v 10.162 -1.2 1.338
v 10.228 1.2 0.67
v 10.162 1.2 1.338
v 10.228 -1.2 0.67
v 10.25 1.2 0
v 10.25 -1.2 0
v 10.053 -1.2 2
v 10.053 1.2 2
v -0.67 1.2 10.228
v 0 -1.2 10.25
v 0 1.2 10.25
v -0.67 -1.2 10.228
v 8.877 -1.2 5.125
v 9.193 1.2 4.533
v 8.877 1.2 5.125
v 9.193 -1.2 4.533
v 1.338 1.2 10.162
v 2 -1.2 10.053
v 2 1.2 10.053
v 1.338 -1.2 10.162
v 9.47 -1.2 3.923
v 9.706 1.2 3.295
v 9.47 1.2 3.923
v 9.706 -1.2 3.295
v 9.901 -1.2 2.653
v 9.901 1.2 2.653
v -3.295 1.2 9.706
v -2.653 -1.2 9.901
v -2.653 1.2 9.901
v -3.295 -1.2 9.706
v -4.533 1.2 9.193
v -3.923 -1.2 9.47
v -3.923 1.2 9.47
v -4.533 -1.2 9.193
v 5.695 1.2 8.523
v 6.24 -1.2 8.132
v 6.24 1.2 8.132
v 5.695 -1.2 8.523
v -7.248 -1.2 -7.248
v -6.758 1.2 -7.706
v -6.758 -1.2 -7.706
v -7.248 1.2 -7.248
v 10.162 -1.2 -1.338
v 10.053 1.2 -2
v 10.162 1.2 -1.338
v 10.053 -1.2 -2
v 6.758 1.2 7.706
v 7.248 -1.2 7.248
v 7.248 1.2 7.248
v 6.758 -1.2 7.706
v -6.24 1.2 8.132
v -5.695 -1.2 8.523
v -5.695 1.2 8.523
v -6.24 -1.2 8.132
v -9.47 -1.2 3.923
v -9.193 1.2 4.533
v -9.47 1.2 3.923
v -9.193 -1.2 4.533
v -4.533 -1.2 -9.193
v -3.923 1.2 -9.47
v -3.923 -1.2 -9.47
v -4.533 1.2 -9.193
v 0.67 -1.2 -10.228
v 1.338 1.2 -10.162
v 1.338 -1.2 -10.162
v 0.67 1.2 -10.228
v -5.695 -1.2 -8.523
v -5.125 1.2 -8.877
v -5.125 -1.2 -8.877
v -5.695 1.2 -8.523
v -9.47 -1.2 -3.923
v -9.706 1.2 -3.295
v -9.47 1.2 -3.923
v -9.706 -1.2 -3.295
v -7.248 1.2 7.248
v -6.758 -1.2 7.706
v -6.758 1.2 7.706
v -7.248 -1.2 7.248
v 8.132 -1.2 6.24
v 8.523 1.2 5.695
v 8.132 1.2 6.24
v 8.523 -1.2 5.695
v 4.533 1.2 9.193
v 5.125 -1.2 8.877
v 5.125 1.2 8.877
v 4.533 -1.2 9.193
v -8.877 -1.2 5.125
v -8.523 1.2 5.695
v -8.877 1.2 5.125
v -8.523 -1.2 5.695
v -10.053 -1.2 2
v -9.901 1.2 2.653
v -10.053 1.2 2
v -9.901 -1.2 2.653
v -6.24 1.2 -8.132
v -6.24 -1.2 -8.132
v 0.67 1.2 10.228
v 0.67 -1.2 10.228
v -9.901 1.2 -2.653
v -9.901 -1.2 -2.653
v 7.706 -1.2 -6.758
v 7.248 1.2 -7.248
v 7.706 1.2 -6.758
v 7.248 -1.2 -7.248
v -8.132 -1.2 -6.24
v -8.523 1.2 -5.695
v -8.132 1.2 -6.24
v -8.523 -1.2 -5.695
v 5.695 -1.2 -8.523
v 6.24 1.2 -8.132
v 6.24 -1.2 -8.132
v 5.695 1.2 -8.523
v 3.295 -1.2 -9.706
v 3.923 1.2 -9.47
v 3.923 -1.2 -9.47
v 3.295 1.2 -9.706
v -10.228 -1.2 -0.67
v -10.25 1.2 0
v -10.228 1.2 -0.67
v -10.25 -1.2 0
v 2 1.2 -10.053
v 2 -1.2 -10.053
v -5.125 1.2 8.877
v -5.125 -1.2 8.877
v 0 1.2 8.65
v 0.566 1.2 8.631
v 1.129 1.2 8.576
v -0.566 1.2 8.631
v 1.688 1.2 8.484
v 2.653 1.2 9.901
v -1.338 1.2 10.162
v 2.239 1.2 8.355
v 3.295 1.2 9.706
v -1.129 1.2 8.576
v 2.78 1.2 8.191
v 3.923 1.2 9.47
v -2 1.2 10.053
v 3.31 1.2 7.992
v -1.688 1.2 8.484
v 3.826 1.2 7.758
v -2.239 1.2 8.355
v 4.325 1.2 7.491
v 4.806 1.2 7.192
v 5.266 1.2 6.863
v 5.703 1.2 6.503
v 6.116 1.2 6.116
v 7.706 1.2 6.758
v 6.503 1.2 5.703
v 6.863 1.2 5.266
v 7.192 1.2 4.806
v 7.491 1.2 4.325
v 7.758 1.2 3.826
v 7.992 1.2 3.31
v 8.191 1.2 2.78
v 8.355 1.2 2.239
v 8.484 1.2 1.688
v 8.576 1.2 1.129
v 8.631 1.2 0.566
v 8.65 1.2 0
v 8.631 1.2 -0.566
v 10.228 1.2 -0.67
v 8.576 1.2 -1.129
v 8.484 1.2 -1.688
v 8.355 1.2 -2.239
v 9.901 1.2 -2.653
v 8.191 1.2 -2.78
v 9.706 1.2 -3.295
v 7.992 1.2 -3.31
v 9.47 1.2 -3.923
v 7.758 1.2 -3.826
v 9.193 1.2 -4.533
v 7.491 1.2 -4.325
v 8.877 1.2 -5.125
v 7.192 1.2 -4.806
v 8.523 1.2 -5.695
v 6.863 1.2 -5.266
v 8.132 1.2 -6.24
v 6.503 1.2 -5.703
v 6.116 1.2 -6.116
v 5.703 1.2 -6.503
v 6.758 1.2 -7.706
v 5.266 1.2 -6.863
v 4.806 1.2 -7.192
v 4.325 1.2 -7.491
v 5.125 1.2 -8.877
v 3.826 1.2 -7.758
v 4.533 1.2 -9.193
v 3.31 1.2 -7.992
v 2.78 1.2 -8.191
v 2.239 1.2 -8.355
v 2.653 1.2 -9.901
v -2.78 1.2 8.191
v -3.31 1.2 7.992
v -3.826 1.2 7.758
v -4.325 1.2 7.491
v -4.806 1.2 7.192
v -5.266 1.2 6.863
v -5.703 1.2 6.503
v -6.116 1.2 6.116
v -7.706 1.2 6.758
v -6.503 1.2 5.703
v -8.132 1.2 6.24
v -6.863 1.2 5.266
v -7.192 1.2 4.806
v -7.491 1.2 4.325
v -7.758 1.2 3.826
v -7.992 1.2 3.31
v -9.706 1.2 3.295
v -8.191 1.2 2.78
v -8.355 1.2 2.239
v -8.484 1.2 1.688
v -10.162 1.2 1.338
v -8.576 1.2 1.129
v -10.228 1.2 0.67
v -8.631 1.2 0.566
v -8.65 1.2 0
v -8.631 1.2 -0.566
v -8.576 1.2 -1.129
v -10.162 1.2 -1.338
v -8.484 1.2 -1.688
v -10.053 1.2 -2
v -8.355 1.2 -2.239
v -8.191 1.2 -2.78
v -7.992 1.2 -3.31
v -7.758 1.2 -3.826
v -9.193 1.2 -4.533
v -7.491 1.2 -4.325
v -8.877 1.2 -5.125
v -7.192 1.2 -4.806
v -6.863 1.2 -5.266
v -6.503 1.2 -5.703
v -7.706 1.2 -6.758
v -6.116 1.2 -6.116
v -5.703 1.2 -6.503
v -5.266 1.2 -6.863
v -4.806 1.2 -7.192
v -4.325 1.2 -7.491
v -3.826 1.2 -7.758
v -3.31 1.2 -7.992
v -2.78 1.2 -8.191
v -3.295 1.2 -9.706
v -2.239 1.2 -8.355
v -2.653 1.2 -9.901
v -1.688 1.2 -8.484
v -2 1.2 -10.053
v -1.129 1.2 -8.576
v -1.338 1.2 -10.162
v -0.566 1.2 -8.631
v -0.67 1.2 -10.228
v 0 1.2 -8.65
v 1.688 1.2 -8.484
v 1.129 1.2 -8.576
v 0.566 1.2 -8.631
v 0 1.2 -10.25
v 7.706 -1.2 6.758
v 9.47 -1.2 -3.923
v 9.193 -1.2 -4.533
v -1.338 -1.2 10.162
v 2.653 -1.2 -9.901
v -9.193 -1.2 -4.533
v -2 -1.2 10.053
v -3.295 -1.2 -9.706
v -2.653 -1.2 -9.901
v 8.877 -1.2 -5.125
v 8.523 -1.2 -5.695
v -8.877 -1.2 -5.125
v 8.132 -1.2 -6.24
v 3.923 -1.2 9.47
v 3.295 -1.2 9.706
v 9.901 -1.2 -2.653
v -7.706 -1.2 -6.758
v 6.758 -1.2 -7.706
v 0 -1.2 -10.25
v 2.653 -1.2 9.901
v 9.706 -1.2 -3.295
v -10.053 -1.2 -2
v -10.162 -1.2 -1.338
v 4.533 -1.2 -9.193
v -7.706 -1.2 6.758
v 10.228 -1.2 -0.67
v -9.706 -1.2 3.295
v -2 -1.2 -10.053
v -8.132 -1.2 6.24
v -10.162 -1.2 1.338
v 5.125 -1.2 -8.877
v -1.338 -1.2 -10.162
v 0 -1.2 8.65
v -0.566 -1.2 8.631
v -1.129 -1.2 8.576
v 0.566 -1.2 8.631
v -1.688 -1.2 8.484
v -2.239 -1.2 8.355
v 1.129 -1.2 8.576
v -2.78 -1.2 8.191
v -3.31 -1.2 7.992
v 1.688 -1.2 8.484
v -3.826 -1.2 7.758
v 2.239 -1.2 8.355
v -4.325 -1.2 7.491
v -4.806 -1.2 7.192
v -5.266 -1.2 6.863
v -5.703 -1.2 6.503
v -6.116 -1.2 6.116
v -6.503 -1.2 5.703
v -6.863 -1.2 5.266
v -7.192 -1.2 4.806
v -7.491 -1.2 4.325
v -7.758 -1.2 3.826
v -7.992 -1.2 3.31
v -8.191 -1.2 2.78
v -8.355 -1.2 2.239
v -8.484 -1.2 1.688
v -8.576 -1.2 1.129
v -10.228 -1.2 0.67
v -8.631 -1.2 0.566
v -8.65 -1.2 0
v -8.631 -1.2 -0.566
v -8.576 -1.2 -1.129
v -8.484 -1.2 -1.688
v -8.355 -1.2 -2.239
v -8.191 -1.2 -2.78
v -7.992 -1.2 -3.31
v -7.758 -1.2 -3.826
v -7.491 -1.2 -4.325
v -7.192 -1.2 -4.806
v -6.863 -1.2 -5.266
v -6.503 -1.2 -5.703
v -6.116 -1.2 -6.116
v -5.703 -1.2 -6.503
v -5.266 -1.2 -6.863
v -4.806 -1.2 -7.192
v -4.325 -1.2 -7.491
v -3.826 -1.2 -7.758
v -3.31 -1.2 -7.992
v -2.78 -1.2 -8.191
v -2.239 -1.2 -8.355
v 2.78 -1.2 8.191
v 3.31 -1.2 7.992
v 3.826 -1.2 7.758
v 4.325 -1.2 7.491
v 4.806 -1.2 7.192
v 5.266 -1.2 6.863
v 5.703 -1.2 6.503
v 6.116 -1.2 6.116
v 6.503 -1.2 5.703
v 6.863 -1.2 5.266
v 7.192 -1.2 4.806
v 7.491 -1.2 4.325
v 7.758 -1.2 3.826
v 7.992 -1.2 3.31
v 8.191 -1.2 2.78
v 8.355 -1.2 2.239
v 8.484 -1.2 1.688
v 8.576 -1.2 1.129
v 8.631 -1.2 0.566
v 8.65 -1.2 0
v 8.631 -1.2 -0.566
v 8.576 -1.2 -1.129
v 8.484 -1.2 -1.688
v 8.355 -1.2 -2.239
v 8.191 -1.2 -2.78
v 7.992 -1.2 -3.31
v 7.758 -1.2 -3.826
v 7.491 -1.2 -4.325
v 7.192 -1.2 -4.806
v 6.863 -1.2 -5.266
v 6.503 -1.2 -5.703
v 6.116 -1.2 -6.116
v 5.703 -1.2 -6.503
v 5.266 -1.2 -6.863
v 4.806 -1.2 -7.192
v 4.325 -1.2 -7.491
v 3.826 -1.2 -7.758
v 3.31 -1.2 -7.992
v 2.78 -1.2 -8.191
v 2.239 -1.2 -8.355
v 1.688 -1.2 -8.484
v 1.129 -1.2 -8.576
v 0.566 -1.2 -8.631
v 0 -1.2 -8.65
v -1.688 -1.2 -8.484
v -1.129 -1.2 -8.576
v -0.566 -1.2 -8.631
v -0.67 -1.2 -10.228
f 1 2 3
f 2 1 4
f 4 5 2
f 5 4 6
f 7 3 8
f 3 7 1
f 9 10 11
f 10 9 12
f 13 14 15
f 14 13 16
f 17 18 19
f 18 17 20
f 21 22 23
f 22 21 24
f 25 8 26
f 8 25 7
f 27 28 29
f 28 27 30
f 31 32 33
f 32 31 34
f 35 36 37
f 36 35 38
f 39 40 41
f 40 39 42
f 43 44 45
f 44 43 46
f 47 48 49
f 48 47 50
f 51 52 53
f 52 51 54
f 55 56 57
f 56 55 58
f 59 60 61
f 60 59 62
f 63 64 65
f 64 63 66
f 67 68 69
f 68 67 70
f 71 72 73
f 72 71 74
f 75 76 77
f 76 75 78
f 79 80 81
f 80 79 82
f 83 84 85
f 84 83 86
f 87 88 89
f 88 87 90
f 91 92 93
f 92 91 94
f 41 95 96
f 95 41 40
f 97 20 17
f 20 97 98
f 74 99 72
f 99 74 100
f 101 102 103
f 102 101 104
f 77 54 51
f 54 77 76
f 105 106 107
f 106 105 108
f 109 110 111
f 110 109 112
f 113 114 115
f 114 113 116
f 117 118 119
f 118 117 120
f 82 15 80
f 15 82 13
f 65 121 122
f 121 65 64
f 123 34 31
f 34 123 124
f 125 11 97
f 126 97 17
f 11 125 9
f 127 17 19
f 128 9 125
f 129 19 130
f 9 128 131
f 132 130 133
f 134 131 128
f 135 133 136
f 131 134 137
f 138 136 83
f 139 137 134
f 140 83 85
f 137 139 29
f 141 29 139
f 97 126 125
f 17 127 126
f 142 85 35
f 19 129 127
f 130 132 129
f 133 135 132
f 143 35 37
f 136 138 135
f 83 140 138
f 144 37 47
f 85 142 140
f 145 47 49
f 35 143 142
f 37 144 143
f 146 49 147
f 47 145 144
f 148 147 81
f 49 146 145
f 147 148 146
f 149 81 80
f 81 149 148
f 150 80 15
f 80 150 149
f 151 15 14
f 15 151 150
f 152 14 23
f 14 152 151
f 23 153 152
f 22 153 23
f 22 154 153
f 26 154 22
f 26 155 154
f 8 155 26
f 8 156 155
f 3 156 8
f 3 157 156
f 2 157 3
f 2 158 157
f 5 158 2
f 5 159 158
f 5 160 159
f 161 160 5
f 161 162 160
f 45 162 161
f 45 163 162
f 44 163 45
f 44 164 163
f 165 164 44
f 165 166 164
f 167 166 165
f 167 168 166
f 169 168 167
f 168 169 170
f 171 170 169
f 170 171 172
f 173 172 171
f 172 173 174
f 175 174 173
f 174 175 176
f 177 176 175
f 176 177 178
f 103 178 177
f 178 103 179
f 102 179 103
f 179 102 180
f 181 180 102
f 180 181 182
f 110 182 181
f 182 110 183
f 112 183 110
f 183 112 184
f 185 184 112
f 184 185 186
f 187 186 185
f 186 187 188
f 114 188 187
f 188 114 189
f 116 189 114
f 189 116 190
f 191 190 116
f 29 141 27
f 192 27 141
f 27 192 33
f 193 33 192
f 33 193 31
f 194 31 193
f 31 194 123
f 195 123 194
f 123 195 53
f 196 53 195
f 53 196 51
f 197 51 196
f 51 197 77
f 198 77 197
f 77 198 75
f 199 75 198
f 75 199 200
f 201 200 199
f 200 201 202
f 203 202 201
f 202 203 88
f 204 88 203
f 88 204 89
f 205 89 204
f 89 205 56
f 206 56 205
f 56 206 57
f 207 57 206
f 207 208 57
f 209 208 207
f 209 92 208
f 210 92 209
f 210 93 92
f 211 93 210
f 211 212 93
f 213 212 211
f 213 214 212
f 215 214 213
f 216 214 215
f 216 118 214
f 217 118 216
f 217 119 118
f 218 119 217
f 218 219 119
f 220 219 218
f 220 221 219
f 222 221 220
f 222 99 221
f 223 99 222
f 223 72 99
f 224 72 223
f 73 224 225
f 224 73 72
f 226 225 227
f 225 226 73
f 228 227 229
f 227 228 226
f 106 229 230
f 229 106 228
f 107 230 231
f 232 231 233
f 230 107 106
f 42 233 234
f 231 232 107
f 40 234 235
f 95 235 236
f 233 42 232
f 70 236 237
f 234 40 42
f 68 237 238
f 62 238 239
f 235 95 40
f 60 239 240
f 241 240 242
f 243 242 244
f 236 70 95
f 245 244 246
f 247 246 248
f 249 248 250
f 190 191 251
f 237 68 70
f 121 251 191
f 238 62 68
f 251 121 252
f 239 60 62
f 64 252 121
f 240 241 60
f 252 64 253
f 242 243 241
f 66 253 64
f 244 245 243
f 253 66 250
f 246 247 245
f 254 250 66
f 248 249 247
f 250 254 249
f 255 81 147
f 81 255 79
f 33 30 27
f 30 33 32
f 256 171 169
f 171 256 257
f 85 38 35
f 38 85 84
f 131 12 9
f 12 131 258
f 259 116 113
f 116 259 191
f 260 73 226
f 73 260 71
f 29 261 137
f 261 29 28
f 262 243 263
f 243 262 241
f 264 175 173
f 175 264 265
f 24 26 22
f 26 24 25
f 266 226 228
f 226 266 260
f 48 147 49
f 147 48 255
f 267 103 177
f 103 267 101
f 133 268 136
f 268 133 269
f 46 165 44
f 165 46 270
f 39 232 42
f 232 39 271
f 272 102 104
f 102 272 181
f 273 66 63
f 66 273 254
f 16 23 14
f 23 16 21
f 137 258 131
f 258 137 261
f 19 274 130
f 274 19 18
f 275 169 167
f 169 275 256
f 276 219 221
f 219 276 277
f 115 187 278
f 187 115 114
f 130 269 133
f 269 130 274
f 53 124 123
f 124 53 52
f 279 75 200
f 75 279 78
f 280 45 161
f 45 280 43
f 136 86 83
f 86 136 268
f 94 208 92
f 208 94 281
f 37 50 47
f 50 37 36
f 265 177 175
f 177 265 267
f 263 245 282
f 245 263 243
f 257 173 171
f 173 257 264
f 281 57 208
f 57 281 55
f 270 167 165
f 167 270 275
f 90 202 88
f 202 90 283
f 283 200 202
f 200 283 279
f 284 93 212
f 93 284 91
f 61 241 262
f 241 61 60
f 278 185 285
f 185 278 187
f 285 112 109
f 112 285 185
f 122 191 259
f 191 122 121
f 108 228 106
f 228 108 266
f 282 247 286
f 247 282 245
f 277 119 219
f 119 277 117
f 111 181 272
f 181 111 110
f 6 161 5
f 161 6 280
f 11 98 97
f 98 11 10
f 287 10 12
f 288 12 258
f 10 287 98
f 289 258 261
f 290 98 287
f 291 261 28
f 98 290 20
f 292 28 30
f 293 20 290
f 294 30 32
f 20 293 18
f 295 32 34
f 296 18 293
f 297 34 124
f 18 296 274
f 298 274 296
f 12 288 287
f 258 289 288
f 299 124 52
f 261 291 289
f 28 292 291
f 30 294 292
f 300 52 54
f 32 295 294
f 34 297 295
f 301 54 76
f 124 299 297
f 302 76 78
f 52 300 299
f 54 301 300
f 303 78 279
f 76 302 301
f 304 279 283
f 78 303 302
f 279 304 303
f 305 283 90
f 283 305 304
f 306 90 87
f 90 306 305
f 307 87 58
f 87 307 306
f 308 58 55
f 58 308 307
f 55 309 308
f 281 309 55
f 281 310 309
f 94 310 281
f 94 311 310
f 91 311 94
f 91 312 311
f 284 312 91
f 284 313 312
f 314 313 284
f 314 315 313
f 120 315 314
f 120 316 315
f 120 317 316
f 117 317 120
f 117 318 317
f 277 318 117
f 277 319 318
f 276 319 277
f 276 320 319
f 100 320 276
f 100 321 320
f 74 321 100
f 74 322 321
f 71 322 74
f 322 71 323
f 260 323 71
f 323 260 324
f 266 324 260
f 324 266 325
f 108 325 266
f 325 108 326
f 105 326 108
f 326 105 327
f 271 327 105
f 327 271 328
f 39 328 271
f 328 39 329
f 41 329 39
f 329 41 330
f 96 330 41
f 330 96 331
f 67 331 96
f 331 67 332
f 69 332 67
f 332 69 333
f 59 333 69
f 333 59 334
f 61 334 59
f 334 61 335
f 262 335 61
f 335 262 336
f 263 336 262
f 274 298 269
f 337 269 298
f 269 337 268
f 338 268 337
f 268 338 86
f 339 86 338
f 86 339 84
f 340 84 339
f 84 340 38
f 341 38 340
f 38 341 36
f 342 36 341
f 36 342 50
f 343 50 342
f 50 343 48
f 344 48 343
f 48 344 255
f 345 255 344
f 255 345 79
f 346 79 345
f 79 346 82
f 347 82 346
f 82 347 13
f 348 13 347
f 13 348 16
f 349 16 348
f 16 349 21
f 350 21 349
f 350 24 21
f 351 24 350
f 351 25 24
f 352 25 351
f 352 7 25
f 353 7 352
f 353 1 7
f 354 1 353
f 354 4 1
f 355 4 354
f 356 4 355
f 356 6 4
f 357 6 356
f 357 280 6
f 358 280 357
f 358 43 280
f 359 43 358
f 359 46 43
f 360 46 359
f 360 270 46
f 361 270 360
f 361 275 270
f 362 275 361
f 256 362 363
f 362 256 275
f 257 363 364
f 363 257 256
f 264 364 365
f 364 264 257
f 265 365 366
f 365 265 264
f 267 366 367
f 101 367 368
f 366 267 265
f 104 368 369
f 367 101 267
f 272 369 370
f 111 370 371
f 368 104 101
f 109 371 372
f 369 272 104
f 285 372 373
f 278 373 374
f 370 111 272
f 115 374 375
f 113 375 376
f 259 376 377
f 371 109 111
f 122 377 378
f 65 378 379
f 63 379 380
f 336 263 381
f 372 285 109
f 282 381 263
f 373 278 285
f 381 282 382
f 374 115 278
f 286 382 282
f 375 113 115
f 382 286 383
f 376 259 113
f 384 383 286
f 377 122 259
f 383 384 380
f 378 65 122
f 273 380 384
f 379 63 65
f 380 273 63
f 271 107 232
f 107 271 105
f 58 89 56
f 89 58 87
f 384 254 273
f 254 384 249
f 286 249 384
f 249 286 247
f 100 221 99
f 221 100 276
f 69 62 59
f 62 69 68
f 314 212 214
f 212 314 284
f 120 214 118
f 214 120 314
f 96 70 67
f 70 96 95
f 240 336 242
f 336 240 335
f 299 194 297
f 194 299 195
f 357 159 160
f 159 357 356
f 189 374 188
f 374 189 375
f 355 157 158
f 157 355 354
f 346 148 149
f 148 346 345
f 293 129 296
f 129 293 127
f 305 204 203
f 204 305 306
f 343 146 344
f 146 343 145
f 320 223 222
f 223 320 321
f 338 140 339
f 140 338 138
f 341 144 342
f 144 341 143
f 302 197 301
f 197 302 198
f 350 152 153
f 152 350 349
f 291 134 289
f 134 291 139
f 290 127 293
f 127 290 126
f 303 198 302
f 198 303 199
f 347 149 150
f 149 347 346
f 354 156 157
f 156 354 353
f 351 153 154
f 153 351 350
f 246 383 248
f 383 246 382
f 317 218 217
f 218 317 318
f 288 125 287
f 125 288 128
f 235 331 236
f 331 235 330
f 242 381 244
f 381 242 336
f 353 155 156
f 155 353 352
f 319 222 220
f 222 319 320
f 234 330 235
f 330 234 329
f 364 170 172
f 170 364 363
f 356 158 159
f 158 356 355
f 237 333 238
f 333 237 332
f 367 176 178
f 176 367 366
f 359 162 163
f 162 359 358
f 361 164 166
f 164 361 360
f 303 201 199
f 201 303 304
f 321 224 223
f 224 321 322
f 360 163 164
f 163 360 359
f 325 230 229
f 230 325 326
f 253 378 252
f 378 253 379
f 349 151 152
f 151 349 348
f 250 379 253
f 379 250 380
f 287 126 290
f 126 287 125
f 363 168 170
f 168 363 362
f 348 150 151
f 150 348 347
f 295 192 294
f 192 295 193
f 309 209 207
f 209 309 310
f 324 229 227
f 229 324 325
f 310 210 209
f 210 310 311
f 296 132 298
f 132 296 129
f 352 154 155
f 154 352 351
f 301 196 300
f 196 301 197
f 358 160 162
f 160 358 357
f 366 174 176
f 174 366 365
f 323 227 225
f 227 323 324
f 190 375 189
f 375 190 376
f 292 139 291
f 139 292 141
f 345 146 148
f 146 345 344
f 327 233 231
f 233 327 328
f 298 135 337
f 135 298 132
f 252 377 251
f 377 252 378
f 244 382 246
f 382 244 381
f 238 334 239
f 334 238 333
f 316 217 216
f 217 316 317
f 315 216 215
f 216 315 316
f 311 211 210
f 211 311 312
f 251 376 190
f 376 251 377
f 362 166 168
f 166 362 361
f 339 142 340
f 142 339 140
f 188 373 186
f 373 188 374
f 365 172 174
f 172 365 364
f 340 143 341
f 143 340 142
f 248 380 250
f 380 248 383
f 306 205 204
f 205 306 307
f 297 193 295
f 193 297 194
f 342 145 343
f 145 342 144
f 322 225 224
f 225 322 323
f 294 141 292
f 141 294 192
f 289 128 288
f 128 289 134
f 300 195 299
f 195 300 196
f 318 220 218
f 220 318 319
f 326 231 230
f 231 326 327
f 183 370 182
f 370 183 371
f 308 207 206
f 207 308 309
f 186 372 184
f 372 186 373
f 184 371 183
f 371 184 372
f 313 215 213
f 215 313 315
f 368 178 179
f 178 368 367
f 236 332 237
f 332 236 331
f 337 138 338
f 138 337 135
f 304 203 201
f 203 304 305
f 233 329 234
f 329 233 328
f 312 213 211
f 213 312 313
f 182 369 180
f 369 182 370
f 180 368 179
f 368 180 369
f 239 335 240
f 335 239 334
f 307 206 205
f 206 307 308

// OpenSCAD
// Plain ring band
// Parameters
ring_size_mm  = 17.3;   // inner diameter (EU 54) [14:0.1:24]
band_width    = 2.4;    // [1.2:0.1:6]
band_thick    = 1.6;    // [1.2:0.1:3]

$fn = 96;

// Finger axis along Y
module band() {
  rotate([90, 0, 0])
    difference() {
      cylinder(d = ring_size_mm + 2 * band_thick, h = band_width, center = true);
      cylinder(d = ring_size_mm, h = band_width + 1, center = true);
    }
}

band();
